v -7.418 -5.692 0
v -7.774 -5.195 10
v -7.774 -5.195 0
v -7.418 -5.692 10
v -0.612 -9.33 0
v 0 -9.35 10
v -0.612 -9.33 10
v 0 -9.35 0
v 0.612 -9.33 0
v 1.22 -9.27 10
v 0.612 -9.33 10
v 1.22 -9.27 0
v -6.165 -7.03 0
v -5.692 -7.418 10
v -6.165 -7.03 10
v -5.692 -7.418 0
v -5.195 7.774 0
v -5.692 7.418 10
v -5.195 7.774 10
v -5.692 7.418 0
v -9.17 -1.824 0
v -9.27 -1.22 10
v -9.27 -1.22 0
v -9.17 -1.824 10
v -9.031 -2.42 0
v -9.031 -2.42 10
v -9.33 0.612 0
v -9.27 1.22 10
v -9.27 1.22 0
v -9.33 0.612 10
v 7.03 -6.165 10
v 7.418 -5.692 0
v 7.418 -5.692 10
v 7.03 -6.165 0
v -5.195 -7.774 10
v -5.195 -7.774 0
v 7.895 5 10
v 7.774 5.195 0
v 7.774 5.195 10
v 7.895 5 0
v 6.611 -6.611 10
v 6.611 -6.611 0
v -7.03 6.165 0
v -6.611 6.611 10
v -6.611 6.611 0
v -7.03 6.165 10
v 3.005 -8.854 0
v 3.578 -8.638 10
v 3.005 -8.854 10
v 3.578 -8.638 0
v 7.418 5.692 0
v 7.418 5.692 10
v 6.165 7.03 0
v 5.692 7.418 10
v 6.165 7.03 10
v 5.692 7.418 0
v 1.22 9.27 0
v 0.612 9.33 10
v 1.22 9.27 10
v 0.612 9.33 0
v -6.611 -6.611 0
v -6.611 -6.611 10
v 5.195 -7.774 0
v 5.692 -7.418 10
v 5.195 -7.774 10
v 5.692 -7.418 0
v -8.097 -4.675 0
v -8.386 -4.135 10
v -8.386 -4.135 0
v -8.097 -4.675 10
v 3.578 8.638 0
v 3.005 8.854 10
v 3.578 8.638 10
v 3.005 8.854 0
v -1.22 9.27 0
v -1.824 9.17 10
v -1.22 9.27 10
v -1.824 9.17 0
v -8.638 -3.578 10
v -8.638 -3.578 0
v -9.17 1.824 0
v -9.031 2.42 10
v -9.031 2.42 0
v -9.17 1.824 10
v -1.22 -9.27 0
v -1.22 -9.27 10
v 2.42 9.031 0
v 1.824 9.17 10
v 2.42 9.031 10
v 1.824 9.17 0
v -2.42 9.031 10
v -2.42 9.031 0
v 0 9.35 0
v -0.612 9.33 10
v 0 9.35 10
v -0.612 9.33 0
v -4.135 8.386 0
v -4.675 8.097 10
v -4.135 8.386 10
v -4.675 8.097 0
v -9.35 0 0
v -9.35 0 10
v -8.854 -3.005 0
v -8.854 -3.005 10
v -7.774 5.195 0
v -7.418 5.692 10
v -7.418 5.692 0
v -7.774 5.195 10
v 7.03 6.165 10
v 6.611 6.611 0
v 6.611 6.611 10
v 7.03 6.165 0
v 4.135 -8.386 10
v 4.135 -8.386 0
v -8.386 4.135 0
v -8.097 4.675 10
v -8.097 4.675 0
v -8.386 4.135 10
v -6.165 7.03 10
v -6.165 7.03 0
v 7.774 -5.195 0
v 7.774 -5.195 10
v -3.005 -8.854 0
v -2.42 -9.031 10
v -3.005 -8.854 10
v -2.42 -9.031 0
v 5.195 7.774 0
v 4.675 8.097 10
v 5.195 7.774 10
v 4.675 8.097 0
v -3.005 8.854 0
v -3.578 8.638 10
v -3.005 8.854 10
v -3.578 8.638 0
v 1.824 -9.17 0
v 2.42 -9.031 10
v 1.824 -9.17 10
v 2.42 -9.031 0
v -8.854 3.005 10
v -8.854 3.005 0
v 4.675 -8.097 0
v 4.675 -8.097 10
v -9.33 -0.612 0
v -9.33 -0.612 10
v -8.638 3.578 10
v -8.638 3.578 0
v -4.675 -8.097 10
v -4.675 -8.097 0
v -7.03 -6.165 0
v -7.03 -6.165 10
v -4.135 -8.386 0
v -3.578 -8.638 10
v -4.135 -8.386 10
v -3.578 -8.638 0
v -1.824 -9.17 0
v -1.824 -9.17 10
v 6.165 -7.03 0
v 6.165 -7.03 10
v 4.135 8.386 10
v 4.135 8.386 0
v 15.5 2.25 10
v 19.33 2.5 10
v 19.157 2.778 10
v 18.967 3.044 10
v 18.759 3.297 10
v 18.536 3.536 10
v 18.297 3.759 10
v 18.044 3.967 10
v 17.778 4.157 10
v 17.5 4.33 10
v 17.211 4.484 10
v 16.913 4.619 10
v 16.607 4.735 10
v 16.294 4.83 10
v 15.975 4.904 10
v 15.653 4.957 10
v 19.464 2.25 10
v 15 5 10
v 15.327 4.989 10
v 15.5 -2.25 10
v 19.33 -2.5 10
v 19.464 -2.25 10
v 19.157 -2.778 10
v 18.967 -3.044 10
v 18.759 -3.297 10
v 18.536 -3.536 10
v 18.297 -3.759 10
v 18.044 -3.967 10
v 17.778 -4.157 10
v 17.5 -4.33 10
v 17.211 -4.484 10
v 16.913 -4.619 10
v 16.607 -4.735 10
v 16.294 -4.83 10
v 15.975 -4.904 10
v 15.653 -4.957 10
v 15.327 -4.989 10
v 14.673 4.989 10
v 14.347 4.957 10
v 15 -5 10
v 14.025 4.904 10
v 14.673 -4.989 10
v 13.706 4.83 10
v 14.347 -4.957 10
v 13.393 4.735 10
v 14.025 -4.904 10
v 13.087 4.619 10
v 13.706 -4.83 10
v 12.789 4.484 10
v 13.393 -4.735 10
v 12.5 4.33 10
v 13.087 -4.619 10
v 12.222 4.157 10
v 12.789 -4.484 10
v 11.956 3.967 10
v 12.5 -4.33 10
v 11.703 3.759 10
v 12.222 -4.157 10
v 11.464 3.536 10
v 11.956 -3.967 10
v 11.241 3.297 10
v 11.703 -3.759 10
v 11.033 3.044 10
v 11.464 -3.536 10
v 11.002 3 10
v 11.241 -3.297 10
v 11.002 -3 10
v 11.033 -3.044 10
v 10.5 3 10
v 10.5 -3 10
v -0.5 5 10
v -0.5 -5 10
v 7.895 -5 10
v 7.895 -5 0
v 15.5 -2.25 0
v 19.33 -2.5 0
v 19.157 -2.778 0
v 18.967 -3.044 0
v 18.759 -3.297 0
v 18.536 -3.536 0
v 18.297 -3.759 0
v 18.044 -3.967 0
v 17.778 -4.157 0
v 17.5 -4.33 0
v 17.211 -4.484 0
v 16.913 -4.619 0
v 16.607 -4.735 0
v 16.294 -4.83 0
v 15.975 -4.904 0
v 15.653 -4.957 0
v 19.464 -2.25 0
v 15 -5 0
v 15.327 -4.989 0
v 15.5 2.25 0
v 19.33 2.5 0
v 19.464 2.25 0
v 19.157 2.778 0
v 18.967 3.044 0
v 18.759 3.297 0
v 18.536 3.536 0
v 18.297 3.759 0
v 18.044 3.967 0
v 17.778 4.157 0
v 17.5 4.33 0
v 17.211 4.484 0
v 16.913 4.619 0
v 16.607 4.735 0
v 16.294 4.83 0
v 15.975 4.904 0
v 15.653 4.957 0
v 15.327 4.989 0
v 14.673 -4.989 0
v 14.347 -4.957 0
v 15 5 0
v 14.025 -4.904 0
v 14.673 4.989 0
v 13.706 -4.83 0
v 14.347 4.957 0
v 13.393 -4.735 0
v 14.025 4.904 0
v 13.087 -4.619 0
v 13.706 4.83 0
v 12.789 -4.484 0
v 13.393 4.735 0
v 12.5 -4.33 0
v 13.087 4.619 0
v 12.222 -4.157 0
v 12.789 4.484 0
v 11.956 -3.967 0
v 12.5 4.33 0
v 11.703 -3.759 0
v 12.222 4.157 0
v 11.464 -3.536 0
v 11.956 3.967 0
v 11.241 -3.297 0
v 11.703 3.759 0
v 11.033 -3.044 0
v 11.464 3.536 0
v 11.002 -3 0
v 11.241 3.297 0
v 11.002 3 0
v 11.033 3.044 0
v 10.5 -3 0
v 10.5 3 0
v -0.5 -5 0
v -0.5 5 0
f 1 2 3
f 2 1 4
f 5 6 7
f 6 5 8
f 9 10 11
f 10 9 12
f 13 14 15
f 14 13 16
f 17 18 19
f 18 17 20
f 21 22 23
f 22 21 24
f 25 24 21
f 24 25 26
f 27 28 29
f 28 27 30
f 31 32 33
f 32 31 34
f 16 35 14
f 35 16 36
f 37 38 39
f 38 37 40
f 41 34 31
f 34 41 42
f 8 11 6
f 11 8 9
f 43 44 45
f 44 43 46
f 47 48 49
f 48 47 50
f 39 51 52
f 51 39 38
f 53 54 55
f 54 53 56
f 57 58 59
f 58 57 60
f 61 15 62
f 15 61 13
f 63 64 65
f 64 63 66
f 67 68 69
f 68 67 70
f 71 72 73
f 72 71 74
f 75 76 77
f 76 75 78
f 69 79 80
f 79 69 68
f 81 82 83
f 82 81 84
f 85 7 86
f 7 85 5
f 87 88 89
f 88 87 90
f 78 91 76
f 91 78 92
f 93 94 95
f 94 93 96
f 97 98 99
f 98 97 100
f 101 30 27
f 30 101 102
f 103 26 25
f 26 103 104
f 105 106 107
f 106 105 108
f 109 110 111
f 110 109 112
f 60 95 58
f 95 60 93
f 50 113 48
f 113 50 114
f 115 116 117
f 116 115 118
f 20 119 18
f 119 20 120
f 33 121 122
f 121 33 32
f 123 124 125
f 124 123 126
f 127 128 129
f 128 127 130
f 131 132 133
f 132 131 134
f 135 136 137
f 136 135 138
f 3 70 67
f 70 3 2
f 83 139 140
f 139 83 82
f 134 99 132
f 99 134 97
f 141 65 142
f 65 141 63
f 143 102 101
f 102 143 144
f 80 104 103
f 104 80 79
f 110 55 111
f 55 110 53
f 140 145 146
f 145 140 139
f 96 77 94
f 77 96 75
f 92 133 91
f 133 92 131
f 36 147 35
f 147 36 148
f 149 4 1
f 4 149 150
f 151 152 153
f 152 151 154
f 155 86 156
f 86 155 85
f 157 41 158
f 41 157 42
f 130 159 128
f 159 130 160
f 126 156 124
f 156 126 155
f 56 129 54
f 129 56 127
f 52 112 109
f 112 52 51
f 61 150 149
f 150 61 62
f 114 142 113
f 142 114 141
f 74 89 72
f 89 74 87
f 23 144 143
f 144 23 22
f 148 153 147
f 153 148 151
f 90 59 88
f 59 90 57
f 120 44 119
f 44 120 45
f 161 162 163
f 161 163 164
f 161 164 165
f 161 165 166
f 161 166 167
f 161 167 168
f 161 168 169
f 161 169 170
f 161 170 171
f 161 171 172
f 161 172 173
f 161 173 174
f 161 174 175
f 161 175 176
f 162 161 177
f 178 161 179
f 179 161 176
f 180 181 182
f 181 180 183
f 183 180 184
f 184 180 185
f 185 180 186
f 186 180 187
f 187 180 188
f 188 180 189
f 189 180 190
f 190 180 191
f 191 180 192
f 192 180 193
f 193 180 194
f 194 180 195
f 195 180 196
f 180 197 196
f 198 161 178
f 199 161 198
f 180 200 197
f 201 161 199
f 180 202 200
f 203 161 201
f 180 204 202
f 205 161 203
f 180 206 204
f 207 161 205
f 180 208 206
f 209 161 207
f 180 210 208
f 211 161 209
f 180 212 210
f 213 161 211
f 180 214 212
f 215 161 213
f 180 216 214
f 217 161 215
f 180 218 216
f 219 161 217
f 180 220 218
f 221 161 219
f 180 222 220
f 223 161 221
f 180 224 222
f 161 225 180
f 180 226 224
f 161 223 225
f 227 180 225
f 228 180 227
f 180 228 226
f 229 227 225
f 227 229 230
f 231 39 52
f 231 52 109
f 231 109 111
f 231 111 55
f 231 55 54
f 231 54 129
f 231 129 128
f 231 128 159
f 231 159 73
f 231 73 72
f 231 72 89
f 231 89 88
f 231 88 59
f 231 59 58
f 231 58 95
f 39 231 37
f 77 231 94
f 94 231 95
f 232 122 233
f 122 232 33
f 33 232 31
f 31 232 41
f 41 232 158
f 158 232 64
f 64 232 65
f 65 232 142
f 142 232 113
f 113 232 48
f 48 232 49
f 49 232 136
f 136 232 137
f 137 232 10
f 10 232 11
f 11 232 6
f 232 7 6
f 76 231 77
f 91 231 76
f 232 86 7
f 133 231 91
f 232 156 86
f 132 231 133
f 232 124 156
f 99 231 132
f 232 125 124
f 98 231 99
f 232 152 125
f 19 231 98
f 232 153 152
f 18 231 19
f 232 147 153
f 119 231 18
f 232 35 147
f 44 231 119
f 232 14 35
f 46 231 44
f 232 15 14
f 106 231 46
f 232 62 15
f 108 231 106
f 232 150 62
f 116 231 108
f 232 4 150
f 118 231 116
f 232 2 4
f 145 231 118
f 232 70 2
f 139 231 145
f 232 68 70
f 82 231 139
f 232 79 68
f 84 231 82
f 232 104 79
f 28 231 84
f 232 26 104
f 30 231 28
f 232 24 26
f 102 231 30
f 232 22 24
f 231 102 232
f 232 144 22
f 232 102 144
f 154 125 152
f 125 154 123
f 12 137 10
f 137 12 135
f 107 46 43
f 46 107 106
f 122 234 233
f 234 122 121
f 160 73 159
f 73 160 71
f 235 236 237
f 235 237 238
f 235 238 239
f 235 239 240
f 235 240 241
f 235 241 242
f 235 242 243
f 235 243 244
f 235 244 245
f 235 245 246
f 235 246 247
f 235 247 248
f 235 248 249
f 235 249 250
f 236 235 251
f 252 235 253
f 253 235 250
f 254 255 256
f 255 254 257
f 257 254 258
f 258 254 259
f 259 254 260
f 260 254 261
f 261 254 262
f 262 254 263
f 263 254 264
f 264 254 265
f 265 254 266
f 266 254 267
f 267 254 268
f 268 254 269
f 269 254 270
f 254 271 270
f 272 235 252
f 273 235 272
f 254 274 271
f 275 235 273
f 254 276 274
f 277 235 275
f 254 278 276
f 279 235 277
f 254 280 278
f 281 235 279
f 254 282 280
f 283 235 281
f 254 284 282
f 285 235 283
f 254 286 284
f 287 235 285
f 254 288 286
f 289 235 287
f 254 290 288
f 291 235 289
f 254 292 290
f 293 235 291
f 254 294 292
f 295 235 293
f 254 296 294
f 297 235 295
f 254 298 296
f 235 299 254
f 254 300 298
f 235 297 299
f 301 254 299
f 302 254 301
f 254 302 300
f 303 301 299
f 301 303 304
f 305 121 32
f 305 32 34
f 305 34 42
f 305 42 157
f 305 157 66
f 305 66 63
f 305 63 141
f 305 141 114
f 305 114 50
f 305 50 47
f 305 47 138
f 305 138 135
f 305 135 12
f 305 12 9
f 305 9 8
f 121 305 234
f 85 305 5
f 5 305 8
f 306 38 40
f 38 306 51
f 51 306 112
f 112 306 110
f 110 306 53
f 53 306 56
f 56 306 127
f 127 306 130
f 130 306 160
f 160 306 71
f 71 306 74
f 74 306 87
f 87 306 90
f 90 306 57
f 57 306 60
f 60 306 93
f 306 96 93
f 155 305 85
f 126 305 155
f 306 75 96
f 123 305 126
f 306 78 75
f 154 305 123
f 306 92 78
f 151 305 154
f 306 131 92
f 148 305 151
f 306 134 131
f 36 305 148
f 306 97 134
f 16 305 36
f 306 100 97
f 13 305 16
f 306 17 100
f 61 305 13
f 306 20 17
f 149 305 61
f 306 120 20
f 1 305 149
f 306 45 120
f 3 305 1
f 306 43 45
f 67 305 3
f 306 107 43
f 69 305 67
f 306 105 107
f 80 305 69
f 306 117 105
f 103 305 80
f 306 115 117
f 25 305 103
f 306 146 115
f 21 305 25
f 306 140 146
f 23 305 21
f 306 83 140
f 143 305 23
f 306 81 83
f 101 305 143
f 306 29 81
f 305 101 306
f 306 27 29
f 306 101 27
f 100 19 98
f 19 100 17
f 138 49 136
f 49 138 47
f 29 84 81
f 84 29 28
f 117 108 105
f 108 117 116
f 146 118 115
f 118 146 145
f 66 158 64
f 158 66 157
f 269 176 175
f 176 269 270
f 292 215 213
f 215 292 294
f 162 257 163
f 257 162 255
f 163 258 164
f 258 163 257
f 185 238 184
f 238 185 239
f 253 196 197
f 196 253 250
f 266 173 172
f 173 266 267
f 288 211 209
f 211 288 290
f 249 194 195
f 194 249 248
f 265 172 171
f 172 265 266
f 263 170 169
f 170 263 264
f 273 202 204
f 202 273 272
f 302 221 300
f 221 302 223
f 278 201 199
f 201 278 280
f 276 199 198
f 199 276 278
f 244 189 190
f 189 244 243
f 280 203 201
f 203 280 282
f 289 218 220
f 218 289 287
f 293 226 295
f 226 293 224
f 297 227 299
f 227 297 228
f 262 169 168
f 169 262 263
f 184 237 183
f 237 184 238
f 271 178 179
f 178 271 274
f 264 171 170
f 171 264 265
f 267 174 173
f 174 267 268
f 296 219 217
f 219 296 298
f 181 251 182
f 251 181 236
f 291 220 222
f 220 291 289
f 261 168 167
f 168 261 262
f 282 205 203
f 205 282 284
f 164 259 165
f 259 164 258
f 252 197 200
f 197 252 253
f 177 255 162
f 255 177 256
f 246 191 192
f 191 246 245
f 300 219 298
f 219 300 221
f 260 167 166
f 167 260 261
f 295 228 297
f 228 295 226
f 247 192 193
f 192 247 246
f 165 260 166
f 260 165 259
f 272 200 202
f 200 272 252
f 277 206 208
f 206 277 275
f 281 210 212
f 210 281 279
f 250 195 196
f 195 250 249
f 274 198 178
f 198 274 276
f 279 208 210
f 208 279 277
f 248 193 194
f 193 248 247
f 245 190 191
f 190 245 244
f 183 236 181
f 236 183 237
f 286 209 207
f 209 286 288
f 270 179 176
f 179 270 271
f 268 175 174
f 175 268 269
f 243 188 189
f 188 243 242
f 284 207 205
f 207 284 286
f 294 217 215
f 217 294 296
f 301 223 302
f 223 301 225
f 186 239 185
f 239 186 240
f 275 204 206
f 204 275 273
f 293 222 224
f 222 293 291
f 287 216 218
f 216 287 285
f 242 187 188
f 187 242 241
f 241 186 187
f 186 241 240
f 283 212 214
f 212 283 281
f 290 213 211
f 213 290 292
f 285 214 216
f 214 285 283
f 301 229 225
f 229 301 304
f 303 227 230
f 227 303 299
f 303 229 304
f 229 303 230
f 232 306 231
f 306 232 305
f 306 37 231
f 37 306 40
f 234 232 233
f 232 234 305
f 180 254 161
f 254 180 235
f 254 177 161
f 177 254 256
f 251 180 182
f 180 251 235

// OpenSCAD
// Tubing organiser clip - printed flat, snaps onto a 12.7 mm stand rod and holds a small piece of tubing
// Units: mm. No external libraries.

$fn = 96;

// ---- Stand rod ring ----
stand_d  = 12.7;   // stand rod diameter (ring inner diameter)
stand_w  = 3;      // ring wall thickness
stand_r  = stand_d / 2 + stand_w;  // ring outer radius
stand_x0 = 0;      // ring centre X
stand_y0 = 0;      // ring centre Y
stand_wid = 10;    // opening width cut out of the -X side

// ---- Tubing ring ----
tube_d   = 6;      // tubing inner diameter
tube_w   = 2;      // tubing wall thickness
tube_r   = tube_d / 2 + tube_w;  // tubing outer radius
tube_x0  = 15;     // tubing ring centre X
tube_y0  = 0;      // tubing ring centre Y
tube_wid = 4.5;    // opening width cut out of the +X side

// ---- Bridge ----
bridge_w   = 6;    // bridge width (Y)
bridge_x0  = 10;   // bridge centre X (between x = 8 and x = 12)
bridge_h   = 10;   // bridge height (Z)

// ---- Misc ----
eps = 0.5;         // cutter overshoot past faces
total_h = 10;      // extrusion height (Z)

difference() {
    union() {
        // Stand rod ring
        cylinder(r = stand_r, h = total_h);
        // Tubing ring
        translate([tube_x0, tube_y0, 0])
            cylinder(r = tube_r, h = total_h);
        // Solid bridge
        translate([bridge_x0 - bridge_w / 2, -bridge_w / 2, 0])
            cube([bridge_w, bridge_w, bridge_h]);
    }
    // Opening in stand rod ring (removes everything with x < 0 and -5 < y < 5)
    translate([-stand_x0 - eps, -stand_wid / 2, -eps])
        cube([stand_wid + 2 * eps, stand_wid, total_h + 2 * eps]);
    // Opening in tubing ring (removes x > 15 and -2.25 < y < 2.25)
    translate([tube_x0 + eps, -tube_wid / 2, -eps])
        cube([tube_wid + 2 * eps, tube_wid, total_h + 2 * eps]);
}
